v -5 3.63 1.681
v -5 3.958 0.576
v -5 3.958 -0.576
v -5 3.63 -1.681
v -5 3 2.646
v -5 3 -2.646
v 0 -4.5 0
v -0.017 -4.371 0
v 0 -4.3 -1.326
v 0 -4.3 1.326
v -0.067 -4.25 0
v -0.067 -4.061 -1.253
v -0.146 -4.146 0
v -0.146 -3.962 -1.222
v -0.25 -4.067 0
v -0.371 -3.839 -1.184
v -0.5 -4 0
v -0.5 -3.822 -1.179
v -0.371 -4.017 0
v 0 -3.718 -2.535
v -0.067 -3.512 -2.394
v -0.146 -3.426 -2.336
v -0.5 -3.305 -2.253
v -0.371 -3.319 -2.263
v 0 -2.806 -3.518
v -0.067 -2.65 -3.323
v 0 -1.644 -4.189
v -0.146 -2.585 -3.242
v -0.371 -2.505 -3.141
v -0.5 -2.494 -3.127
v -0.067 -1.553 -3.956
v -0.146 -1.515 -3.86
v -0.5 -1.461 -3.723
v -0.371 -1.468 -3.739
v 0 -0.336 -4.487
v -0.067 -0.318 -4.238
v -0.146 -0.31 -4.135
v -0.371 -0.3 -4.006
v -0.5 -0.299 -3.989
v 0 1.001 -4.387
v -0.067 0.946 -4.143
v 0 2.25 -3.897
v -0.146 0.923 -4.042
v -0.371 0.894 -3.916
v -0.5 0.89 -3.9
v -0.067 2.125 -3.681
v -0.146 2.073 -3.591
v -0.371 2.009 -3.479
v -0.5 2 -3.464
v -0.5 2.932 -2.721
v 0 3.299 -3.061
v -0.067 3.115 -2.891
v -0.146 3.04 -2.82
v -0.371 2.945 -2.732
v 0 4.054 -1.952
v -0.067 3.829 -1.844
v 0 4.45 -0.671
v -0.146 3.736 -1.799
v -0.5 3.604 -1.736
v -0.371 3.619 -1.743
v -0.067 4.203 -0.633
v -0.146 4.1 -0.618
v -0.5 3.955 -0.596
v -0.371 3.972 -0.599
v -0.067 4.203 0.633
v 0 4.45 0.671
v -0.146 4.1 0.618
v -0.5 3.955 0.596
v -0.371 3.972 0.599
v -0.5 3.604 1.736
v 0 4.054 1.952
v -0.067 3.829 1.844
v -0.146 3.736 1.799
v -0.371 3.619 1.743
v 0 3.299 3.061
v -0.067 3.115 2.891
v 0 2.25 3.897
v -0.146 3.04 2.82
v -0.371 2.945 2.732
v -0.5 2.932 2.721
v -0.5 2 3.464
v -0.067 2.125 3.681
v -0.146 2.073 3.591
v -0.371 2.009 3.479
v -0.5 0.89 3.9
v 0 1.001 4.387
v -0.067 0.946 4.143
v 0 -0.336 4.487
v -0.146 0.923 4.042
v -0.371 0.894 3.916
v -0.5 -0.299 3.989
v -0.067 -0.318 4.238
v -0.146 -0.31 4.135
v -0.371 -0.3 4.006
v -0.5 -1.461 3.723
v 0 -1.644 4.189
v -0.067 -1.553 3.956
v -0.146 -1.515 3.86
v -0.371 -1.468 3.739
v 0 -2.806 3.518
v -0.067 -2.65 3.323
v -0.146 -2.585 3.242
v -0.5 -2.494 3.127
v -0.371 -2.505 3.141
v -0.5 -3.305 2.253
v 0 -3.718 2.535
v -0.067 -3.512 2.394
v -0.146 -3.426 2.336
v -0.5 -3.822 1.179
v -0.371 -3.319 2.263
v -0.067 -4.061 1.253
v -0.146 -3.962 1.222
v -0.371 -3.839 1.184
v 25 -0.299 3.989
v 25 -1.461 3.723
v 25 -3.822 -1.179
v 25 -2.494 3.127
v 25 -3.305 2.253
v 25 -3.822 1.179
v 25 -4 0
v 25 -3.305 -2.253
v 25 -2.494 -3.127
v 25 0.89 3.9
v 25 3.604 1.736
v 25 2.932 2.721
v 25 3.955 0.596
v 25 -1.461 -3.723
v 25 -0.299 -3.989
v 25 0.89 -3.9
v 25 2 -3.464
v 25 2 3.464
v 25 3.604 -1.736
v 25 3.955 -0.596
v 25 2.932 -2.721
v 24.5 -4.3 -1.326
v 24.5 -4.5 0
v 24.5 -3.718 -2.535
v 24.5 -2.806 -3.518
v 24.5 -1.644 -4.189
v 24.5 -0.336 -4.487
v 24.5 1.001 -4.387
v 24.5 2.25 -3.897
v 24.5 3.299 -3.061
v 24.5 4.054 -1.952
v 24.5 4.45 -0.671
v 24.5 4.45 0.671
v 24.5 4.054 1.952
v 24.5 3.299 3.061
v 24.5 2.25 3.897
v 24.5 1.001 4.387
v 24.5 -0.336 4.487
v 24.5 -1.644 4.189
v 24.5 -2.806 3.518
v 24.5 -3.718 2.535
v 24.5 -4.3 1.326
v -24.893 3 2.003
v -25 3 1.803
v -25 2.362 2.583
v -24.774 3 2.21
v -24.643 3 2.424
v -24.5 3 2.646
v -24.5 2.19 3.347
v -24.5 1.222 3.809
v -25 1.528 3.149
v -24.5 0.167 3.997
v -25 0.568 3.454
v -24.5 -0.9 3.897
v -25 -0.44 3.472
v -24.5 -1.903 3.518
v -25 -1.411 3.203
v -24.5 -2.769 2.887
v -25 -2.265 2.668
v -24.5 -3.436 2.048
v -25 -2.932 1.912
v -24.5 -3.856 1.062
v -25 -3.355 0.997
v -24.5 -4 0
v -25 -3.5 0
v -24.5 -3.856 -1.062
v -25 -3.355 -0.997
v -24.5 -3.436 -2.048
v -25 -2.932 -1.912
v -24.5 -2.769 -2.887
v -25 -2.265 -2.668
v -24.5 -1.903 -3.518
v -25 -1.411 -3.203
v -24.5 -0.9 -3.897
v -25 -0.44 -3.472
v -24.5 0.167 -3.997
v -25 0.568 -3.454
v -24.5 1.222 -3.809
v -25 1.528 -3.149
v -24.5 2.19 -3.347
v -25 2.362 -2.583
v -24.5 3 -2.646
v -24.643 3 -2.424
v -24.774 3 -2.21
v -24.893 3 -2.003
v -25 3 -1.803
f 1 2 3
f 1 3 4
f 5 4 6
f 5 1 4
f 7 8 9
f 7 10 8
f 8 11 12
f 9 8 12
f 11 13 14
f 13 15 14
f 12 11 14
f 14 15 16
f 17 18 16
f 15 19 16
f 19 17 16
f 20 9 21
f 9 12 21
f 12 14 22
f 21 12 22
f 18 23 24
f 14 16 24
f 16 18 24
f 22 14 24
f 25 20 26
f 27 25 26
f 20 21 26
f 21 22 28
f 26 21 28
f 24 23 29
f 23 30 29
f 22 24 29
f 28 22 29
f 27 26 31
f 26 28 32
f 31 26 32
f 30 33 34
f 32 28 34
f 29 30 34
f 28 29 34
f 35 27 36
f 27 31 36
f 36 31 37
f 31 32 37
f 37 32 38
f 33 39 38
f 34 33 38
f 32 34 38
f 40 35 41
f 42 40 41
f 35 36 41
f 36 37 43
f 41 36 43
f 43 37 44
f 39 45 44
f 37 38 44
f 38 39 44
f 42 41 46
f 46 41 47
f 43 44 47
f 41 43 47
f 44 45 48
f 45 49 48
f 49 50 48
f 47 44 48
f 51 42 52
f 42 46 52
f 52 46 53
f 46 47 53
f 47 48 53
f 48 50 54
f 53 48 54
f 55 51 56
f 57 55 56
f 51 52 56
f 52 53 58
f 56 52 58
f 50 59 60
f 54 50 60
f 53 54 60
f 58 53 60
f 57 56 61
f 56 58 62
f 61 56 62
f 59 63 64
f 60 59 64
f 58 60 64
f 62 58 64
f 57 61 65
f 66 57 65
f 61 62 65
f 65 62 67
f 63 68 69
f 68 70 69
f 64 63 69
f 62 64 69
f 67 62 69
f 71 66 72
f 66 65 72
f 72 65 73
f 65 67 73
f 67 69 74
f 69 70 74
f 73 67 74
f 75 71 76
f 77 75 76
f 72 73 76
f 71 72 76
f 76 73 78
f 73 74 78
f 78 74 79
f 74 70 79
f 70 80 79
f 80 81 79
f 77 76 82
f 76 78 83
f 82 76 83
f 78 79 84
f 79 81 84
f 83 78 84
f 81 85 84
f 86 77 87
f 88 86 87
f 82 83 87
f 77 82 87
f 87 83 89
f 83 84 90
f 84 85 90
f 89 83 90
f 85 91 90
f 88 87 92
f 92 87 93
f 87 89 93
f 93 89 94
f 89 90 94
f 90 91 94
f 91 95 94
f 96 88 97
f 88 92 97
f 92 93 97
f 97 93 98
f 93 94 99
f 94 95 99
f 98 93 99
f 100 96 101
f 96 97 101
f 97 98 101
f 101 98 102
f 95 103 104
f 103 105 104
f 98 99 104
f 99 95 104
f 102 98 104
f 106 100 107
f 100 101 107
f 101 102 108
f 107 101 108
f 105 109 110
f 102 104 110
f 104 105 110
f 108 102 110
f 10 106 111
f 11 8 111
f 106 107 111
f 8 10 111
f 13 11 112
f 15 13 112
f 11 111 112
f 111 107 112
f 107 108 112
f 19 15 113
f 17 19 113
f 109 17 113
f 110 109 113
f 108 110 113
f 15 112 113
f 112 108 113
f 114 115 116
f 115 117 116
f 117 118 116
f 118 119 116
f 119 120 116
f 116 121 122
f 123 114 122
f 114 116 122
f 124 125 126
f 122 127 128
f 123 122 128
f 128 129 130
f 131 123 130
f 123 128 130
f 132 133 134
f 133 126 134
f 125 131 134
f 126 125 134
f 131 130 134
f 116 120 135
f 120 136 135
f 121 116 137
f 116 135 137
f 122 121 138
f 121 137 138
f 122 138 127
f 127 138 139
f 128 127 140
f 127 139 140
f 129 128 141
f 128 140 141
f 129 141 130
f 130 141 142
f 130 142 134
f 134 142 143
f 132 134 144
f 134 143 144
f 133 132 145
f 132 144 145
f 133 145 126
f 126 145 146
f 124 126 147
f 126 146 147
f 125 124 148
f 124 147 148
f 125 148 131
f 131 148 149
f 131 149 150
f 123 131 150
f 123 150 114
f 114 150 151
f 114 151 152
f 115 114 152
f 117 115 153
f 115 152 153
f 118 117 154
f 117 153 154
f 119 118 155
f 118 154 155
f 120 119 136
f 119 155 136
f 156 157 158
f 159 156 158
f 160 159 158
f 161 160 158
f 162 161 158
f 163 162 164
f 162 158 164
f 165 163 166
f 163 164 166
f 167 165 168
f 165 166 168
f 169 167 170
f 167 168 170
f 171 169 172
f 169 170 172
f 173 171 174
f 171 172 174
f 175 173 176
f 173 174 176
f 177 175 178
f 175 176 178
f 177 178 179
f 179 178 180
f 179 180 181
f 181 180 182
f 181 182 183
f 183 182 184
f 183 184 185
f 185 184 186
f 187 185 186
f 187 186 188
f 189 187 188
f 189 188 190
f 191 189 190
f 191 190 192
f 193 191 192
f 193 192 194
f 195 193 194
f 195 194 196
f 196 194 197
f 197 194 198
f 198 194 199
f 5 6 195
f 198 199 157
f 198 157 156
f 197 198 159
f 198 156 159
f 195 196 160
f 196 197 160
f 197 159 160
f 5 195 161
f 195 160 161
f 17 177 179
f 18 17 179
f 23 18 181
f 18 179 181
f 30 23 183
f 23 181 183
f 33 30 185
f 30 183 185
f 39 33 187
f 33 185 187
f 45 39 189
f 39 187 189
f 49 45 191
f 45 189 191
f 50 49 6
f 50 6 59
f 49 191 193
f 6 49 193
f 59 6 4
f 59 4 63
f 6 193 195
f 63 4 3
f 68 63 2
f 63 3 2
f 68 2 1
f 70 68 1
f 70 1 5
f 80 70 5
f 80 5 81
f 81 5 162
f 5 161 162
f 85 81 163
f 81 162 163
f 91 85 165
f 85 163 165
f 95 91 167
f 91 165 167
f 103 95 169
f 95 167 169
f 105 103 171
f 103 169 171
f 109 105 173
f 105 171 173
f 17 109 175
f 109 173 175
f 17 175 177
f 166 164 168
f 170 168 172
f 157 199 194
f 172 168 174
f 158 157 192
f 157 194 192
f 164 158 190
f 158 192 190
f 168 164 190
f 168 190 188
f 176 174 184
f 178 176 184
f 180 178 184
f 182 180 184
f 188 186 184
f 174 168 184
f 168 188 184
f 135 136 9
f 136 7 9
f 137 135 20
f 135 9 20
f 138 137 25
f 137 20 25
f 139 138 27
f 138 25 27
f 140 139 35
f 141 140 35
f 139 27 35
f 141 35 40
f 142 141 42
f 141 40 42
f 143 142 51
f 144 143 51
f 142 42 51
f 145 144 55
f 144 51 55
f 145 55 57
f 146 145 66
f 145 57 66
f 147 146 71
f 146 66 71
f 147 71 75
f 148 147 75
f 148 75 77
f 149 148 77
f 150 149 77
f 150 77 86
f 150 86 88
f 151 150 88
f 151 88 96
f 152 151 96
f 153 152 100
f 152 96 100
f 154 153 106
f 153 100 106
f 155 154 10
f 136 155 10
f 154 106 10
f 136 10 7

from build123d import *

# Parameters (mm, degrees)
CUT_EXTRUDE_1_DEPTH = 20


with BuildPart() as part:
    # 草图1 → 旋转1 (revolve)
    with BuildSketch(Plane.XY, mode=Mode.PRIVATE) as revolve_1_sk:
        with BuildLine():
            Line((25, 0), (25, 4))
            Line((25, 4), (24.5, 4.5))
            Line((24.5, 4.5), (0, 4.5))
            ThreePointArc((0, 4.5), (-0.146446609, 4.146446609), (-0.5, 4))
            Line((-0.5, 4), (-24.5, 4))
            Line((-24.5, 4), (-25, 3.5))
            Line((-25, 3.5), (-25, 0))
            Line((-25, 0), (25, 0))
        make_face()
    revolve(revolve_1_sk.sketch.rotate(Axis((-25, 0, 0), (1, 0, 0)), 180), axis=Axis((-25, 0, 0), (1, 0, 0)))

    # 草图2 → 切除-拉伸1 (cut)
    with BuildSketch(Plane.ZY.offset(25)):
        with BuildLine():
            Line((-2.645751311, 3), (2.645751311, 3))
            ThreePointArc((2.645751311, 3), (0, 4), (-2.645751311, 3))
        make_face()
    extrude(amount=-CUT_EXTRUDE_1_DEPTH, mode=Mode.SUBTRACT)


solid = part.part
